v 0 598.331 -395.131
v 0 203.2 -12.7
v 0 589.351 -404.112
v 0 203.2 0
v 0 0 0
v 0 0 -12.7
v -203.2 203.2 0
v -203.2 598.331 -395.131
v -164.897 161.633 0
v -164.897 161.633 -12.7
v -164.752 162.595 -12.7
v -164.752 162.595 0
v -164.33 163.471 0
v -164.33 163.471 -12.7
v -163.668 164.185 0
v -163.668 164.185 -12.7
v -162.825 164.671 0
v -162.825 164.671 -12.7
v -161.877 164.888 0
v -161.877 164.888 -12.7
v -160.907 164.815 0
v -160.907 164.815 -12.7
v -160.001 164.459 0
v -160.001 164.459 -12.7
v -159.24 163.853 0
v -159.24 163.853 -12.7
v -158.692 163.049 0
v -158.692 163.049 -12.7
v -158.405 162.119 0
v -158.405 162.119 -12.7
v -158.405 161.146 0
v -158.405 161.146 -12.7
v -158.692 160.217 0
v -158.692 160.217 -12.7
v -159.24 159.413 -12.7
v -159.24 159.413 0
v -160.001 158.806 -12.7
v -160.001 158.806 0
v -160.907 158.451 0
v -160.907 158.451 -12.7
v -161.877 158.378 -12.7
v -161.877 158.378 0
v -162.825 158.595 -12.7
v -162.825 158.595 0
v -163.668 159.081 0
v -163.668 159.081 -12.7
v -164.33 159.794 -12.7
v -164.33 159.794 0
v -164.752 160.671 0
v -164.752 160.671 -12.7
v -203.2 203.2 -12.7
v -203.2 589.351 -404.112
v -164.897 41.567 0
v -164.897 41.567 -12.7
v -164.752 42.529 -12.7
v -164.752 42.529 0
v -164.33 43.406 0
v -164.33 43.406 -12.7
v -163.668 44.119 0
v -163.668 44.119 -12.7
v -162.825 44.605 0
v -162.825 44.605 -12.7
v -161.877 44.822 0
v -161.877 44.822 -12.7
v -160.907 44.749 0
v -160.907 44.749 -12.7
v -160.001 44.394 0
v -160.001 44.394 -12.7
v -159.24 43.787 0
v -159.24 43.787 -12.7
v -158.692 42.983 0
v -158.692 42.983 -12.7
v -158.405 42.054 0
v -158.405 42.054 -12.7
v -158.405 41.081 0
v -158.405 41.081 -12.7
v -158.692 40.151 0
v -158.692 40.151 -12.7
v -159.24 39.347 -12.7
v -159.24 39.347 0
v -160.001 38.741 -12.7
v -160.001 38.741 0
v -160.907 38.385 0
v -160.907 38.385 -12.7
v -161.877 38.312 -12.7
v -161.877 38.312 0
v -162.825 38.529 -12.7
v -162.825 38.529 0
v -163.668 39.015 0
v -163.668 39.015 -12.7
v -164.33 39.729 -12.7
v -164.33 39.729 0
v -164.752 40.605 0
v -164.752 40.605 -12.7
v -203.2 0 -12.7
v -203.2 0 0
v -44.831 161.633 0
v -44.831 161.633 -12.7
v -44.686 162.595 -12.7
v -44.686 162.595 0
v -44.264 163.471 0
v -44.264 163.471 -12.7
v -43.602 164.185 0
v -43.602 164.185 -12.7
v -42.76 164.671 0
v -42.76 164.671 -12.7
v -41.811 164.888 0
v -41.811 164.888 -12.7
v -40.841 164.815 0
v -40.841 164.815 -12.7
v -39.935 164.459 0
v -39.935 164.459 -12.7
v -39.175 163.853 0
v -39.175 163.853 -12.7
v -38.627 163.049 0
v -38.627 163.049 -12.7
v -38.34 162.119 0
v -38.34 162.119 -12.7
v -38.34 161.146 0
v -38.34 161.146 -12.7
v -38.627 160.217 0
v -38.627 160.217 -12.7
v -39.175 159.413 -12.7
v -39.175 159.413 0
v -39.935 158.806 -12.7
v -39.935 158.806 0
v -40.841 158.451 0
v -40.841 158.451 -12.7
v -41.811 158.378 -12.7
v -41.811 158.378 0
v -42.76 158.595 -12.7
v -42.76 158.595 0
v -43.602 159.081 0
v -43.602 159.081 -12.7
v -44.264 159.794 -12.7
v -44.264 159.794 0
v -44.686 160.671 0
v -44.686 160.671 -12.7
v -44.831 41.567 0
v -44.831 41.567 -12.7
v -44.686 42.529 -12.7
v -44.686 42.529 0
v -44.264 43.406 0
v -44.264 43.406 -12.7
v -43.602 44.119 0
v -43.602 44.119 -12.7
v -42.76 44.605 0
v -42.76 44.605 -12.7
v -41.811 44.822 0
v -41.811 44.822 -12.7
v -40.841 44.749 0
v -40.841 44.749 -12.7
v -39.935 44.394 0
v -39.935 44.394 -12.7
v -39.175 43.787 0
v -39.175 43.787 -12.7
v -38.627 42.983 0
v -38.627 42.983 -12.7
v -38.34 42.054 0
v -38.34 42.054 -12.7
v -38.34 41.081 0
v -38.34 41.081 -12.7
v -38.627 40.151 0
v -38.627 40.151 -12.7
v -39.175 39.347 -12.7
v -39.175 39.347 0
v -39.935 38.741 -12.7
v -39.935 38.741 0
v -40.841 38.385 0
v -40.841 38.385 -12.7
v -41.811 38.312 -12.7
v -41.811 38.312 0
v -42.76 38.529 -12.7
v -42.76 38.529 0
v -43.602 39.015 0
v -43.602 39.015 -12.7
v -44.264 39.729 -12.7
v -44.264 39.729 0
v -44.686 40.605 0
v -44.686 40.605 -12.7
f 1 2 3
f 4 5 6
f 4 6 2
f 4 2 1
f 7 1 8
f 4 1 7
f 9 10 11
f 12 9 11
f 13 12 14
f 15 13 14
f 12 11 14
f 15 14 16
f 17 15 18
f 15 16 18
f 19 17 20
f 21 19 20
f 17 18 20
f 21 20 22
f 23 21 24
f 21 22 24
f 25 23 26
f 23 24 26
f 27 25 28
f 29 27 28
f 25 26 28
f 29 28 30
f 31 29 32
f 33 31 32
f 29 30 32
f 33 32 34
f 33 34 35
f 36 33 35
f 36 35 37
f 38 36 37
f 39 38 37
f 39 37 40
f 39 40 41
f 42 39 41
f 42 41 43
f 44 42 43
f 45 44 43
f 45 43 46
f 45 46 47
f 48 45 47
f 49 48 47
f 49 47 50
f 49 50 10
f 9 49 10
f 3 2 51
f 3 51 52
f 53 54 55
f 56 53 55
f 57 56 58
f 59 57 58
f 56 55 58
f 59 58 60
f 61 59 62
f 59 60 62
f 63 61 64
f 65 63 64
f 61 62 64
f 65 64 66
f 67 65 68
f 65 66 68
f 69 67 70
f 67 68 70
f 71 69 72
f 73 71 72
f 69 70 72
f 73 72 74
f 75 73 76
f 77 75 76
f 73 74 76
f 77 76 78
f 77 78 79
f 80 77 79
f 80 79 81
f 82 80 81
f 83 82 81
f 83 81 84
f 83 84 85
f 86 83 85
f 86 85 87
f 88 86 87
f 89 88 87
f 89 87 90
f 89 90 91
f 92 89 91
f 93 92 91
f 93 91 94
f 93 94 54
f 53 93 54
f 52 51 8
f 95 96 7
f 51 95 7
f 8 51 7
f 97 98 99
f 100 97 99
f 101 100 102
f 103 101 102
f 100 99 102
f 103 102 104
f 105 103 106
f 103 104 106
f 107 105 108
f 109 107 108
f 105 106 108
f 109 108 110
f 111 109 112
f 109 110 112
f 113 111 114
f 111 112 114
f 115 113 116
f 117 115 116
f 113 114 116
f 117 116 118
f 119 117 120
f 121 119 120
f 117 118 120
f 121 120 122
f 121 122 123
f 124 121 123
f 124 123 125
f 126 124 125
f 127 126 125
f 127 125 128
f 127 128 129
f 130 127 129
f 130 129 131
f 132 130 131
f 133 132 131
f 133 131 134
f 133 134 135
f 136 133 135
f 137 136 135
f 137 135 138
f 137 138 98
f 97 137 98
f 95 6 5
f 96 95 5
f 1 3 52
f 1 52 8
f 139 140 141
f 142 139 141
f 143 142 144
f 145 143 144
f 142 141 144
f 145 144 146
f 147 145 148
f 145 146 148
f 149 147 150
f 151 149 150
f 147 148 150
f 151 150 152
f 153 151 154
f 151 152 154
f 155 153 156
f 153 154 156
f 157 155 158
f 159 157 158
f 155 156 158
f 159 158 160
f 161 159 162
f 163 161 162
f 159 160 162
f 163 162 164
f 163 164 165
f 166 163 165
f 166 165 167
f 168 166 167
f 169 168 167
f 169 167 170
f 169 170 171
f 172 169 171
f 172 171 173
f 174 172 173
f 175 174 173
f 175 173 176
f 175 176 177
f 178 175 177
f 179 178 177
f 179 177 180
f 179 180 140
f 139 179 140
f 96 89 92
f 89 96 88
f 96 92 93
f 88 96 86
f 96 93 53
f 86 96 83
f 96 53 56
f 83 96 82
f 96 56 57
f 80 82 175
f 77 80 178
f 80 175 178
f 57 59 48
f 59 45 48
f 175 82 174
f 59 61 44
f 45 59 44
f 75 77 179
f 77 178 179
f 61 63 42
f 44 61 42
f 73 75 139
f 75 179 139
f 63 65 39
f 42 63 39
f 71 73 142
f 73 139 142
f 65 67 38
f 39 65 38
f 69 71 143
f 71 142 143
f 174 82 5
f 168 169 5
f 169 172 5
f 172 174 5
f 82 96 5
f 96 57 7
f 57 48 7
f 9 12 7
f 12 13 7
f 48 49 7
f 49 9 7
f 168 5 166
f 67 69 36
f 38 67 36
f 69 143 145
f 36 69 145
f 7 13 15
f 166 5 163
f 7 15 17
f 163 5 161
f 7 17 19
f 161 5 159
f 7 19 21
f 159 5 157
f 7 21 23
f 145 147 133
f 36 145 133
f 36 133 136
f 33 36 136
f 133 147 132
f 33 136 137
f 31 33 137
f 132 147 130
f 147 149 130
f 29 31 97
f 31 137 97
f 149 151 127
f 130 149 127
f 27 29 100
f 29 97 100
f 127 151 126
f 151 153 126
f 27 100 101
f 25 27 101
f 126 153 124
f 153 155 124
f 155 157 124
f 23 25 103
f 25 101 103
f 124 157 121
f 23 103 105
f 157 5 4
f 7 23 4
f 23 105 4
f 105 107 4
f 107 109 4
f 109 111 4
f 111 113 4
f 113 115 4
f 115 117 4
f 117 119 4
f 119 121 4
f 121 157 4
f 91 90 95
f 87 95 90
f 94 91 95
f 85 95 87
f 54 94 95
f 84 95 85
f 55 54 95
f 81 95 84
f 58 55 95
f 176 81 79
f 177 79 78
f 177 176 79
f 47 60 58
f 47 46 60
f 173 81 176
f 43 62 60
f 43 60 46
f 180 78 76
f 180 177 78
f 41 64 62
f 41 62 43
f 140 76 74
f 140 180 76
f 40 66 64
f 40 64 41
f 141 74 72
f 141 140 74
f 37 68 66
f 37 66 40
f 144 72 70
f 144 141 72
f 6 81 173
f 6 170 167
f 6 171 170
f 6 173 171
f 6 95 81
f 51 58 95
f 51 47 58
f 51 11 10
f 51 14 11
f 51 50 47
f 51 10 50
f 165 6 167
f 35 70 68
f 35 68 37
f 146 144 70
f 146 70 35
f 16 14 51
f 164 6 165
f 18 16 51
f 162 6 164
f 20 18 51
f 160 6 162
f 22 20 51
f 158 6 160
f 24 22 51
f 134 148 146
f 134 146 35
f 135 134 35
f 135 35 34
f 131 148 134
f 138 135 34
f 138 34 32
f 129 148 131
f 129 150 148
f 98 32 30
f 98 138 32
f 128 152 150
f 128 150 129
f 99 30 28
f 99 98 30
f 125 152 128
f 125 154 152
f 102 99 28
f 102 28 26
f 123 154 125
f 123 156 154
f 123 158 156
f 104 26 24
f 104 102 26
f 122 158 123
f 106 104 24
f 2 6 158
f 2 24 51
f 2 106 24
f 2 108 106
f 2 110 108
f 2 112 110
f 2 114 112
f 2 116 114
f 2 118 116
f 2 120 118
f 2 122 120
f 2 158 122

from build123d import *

# Parameters (mm, degrees)
F0_W     = 203.2
F0_H     = 12.7
F1_DEPTH = 203.2
F3_D     = 6.5278


with BuildPart() as f1:
    # F0 (on Right) → F1 (new body)
    with BuildSketch(Plane.YZ):
        with Locations((101.6, -6.35)):
            Rectangle(F0_W, F0_H)
        Polygon((598.331269327, -395.131269327), (203.2, 0), (203.2, -12.7), (589.351013206, -404.1115254481), align=None)
    extrude(amount=-F1_DEPTH)

    # F3 (through all)
    with Locations(Plane.XY):
        with Locations((-161.6327916476, 161.6327916476), (-161.6327916476, 41.5672083524), (-41.5672083524, 41.5672083524), (-41.5672083524, 161.6327916476)):
            Hole(F3_D / 2)


solid = f1.part
